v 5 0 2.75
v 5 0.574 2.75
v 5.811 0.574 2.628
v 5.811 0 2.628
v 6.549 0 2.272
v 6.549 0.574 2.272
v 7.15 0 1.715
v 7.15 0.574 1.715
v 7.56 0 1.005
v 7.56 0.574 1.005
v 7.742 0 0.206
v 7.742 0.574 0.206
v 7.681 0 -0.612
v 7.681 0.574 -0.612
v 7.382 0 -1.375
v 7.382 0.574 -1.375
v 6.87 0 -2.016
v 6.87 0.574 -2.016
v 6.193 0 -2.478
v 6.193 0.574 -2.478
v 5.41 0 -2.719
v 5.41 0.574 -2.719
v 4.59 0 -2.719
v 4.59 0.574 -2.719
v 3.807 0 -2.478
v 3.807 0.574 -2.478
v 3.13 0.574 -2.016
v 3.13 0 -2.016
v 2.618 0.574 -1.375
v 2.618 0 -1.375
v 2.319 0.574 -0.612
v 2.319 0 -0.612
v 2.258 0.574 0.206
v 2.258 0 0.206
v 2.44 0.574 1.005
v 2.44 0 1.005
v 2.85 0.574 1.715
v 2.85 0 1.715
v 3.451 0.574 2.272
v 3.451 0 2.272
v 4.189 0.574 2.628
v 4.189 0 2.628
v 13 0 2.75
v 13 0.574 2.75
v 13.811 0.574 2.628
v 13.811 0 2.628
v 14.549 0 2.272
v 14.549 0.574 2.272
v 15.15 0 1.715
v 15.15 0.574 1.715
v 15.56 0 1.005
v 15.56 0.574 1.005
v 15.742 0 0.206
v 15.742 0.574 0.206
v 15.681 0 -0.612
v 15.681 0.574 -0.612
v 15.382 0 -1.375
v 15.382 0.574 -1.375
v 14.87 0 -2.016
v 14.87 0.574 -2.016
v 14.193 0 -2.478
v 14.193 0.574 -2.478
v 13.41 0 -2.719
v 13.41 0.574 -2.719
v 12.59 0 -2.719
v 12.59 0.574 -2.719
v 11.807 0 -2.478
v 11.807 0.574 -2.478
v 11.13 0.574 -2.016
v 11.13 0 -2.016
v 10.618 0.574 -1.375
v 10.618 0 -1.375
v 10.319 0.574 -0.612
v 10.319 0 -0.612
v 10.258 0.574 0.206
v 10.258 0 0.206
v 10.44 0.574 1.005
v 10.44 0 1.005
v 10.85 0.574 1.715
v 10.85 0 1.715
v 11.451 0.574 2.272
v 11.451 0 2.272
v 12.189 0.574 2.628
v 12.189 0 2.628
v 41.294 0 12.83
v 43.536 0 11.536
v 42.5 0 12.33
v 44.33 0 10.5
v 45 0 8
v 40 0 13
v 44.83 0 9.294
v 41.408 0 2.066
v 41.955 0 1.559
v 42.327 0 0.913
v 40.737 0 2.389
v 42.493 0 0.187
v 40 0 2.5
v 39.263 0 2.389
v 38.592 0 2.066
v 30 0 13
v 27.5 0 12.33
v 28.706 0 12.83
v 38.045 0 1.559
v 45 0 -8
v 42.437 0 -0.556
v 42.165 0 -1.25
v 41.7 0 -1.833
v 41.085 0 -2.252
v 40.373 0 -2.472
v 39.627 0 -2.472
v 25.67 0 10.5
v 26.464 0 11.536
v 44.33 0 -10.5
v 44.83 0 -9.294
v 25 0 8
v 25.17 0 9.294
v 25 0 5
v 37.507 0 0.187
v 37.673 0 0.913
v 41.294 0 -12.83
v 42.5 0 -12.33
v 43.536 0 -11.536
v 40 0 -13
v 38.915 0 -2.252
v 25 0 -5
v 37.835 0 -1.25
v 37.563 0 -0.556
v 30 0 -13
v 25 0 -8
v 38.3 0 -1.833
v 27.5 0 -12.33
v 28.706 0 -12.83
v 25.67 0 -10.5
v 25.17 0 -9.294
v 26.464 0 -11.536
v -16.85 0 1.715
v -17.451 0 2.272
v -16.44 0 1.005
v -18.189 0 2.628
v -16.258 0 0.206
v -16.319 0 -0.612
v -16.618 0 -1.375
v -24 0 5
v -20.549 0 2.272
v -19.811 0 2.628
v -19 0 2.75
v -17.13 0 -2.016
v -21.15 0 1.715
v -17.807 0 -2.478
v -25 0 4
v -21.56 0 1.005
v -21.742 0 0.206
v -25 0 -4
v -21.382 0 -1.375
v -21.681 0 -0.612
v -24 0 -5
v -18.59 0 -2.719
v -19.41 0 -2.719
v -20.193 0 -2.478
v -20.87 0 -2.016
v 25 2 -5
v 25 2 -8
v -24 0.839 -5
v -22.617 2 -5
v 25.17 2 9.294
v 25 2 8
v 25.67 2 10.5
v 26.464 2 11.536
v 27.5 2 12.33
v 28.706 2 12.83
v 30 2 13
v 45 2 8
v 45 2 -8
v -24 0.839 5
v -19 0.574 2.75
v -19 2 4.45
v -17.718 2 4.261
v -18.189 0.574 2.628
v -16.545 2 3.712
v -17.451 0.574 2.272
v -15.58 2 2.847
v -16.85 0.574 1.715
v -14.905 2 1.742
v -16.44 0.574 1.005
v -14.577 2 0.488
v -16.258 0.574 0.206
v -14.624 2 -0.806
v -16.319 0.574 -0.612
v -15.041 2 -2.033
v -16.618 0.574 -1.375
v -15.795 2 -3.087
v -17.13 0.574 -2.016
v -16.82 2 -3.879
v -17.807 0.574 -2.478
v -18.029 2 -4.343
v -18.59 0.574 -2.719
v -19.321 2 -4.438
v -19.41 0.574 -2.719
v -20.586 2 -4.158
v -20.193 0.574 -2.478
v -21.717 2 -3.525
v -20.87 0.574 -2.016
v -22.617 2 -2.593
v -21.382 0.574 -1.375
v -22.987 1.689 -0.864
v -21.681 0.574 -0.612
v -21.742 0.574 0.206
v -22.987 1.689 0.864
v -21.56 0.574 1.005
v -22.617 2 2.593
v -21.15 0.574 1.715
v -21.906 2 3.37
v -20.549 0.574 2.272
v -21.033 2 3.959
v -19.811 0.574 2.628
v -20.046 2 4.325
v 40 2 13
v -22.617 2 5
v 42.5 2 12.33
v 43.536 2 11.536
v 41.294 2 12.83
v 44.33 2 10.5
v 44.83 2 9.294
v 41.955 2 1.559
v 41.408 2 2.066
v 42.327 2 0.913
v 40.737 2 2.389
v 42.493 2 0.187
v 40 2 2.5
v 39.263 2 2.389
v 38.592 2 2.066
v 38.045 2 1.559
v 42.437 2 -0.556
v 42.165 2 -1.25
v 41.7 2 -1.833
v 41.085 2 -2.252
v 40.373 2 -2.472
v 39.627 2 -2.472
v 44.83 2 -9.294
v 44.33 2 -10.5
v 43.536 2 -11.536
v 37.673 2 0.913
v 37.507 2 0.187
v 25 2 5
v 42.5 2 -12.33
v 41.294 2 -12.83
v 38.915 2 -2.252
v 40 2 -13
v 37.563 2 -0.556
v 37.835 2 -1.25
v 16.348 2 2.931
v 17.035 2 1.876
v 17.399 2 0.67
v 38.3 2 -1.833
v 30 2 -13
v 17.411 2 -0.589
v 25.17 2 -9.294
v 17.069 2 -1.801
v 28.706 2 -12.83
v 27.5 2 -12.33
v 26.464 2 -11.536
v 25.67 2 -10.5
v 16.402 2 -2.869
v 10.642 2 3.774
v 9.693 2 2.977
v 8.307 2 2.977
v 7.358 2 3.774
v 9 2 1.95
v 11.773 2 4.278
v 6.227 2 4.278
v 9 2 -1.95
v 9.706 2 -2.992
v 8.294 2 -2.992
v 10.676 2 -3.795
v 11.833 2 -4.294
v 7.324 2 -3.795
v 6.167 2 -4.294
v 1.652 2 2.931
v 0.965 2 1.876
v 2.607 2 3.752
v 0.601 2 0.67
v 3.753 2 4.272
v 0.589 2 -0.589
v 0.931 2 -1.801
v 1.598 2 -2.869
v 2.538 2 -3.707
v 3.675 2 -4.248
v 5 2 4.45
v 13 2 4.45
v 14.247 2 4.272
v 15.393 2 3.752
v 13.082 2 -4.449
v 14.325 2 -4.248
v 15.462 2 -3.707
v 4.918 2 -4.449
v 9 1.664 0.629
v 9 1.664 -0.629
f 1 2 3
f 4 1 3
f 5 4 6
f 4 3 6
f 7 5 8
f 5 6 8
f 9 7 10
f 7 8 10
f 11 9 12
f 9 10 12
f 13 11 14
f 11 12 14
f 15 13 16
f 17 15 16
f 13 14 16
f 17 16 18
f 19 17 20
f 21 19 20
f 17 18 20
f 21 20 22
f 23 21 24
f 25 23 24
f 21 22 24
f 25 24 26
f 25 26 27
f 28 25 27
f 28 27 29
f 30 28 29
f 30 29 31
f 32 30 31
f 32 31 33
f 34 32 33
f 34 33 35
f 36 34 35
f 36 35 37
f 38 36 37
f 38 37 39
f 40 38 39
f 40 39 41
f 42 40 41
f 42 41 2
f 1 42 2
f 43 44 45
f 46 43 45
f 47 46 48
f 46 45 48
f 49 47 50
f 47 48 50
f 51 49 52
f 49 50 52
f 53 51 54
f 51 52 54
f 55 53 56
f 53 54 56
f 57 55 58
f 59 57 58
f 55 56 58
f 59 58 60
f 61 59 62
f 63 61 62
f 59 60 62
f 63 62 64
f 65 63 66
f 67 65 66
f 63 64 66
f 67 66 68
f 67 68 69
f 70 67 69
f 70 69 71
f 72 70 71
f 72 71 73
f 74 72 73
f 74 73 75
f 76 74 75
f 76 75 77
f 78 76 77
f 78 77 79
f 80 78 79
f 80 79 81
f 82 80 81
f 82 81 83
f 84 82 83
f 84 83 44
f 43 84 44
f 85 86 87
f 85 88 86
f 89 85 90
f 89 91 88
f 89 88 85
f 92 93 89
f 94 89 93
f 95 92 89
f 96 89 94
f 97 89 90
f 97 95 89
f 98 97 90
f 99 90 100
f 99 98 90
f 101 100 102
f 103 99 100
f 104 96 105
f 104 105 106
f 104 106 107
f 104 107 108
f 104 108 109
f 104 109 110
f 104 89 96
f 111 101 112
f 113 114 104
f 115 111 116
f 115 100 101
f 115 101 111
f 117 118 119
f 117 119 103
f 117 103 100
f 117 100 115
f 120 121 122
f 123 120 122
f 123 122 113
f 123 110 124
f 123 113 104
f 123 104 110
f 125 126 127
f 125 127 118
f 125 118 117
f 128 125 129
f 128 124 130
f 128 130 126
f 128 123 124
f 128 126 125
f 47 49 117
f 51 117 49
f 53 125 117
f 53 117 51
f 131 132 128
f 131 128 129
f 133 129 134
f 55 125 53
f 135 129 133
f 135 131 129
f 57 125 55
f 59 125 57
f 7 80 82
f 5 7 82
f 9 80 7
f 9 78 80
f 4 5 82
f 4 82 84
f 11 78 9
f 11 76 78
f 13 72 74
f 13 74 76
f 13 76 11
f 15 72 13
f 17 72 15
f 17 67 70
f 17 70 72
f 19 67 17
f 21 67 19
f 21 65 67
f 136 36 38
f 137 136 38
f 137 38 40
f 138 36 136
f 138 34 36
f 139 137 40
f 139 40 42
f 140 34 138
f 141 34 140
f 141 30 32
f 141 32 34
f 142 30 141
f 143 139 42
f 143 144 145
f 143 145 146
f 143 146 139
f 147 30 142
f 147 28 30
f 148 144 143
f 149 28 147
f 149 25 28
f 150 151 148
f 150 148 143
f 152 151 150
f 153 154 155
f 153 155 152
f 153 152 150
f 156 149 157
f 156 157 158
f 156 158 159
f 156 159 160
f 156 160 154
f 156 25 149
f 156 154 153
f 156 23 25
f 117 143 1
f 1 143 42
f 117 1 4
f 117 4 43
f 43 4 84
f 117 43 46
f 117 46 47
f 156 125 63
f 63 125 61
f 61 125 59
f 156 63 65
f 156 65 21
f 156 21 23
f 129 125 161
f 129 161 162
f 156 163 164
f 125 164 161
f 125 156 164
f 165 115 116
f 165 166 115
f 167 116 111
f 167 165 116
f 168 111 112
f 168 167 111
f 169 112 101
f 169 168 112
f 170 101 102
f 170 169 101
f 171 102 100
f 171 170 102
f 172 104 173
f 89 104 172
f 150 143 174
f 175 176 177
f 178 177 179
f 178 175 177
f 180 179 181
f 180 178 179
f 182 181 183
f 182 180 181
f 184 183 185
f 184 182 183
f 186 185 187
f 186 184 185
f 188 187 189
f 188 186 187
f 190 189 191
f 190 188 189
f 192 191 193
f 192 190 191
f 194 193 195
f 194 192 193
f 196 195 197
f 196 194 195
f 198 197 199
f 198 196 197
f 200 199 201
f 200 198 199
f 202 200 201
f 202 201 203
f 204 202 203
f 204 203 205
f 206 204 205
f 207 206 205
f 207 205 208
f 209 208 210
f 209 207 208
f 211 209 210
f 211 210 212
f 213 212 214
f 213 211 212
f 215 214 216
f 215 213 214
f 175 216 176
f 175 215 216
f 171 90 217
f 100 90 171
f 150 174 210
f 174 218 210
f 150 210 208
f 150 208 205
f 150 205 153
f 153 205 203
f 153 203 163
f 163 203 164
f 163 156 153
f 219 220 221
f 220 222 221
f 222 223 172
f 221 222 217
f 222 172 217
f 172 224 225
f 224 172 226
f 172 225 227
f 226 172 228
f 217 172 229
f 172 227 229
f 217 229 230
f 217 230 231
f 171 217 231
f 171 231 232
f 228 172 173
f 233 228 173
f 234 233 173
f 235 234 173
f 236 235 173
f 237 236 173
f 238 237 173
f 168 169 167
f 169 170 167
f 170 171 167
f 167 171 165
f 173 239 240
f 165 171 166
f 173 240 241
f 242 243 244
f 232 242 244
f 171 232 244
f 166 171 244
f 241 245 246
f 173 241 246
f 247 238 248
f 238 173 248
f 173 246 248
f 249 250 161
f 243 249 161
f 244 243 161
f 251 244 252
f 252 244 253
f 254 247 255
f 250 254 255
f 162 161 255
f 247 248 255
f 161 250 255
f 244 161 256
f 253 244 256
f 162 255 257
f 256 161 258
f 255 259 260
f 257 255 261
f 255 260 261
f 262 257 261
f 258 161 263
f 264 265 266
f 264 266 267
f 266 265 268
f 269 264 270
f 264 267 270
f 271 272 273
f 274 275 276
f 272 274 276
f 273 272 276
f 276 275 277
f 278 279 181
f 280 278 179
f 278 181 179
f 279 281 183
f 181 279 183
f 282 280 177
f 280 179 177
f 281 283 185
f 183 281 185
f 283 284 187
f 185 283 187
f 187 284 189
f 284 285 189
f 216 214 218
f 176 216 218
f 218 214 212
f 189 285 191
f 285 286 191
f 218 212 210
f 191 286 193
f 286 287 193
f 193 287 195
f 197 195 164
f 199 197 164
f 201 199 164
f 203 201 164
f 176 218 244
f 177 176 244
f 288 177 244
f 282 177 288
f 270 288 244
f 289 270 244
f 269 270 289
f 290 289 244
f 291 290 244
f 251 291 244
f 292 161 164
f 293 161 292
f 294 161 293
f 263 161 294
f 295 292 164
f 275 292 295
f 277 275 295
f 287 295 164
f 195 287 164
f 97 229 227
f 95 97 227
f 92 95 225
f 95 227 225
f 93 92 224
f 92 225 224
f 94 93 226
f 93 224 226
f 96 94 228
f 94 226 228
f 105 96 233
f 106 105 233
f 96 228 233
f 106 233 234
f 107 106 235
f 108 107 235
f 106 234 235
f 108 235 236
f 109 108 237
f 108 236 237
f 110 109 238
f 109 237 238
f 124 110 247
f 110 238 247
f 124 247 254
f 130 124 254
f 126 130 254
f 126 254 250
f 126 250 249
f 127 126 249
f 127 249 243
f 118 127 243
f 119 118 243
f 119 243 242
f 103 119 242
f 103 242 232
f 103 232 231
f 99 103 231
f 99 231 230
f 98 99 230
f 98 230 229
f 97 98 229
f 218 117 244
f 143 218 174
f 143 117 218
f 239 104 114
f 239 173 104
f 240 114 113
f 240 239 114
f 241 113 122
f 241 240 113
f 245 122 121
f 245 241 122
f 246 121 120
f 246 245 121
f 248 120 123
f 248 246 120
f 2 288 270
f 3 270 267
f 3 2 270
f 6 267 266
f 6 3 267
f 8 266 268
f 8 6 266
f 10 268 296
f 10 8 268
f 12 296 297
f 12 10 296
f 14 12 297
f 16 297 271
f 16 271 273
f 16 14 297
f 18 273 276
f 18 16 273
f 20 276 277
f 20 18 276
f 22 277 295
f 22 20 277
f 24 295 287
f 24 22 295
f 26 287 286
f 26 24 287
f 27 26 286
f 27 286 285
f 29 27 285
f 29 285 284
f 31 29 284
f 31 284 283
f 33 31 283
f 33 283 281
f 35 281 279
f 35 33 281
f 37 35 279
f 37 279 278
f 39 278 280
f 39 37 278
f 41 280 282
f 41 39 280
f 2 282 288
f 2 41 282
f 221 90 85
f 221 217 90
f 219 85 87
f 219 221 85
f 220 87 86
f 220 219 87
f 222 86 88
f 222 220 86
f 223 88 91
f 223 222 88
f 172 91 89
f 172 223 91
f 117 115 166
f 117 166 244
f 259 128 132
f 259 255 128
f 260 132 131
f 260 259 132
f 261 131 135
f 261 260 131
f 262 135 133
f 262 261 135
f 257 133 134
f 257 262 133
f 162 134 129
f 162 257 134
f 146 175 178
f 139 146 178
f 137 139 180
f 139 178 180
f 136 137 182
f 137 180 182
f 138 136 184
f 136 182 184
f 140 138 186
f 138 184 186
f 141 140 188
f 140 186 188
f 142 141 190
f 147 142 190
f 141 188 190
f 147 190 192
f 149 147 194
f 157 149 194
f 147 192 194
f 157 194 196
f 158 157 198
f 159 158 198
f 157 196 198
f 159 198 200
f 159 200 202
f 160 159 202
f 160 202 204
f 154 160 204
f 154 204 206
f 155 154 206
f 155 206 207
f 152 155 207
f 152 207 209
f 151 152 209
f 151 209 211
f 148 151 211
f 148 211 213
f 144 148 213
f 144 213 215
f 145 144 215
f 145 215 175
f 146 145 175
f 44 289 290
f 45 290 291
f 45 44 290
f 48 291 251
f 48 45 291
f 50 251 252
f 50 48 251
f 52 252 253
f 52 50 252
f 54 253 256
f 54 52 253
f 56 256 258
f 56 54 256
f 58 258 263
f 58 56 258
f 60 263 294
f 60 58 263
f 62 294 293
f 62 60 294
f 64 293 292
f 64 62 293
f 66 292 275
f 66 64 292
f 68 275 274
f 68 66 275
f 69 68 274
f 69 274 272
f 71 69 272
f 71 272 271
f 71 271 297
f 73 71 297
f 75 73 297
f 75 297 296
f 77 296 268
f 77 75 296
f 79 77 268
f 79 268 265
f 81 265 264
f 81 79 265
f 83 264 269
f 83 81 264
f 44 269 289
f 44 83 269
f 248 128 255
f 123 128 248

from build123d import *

# Parameters (mm, degrees)
BOSS_EXTRUDE1_DEPTH = 2
CHAMFER1_SIZE       = 1
FILLET1_R           = 5
SKETCH2_R           = 2.5
CUT_EXTRUDE1_DEPTH  = 3
SKETCH3_R           = 2.75
CUT_EXTRUDE2_DEPTH  = 3
CHAMFER2_SIZE2      = 2.383507185
CHAMFER2_SIZE       = 2
CHAMFER3_SIZE       = 1.7
CHAMFER3_SIZE_2     = 1.426469373


# Some blends are built 0.0001 mm under size
with BuildPart() as part:
    # Sketch1 → Boss-Extrude1 (new body)
    with BuildSketch(Plane(origin=(0, 0, 0), x_dir=(1, 0, 0), z_dir=(0, 1, 0))):
        Polygon((25, 5), (25, 13), (45, 13), (45, -13), (25, -13), (25, -5), (-25, -5), (-25, 5), align=None)
    extrude(amount=BOSS_EXTRUDE1_DEPTH)

    # Chamfer1
    chamfer1_edges = [part.edges().sort_by_distance(p)[0] for p in [
        (-25, 1, 5),
        (-25, 1, -5),
    ]]
    chamfer(chamfer1_edges, length=CHAMFER1_SIZE)

    # Fillet1
    fillet1_edges = [part.edges().sort_by_distance(p)[0] for p in [
        (25, 1, -13),
        (45, 1, -13),
        (45, 1, 13),
        (25, 1, 13),
    ]]
    fillet(fillet1_edges, radius=FILLET1_R)

    # Sketch2 → Cut-Extrude1 (cut)
    with BuildSketch(Plane(origin=(0, 2, 0), x_dir=(1, 0, 0), z_dir=(0, 1, 0))):
        with Locations(Location((40, 0, 0), (0, 0, 270))):
            Circle(SKETCH2_R)
    extrude(amount=-CUT_EXTRUDE1_DEPTH, mode=Mode.SUBTRACT)

    # Sketch3 → Cut-Extrude2 (cut)
    with BuildSketch(Plane(origin=(0, 2, 0), x_dir=(1, 0, 0), z_dir=(0, 1, 0))):
        with Locations(Location((13, 0, 0), (0, 0, 270))):
            Circle(SKETCH3_R)
        with Locations(Location((5, 0, 0), (0, 0, 270))):
            Circle(SKETCH3_R)
        with Locations(Location((-19, 0, 0), (0, 0, 270))):
            Circle(SKETCH3_R)
    extrude(amount=-CUT_EXTRUDE2_DEPTH, mode=Mode.SUBTRACT)

    # Chamfer2
    chamfer2_edges = [part.edges().sort_by_distance(p)[0] for p in [
        (-25, 2, 0),
    ]]
    chamfer2_side = [part.faces().sort_by_distance(p)[0] for p in [
        (-25, 1.96, 0),
    ]]
    chamfer(chamfer2_edges, length=CHAMFER2_SIZE - 0.0001, length2=CHAMFER2_SIZE2 - 0.0001, reference=chamfer2_side[0])  # a hair under: the kernel refuses the full size

    # Chamfer3
    # the kernel refuses this chamfer: 1.7, 1.426469373 mm, written as the material it takes off along each edge
    with BuildSketch(Plane(origin=(13, 2, 0), x_dir=(0, 0, 1), z_dir=(-1, 0, 0))) as chamfer3_piece_1:
        Polygon((2.75 + CHAMFER3_SIZE, 0), (2.75, -CHAMFER3_SIZE_2), (2.75, 0), align=None)
    revolve(axis=Axis((13, 2, 0), (0, 1, 0)), mode=Mode.SUBTRACT)
    with BuildSketch(Plane(origin=(5, 2, 0), x_dir=(0, 0, 1), z_dir=(-1, 0, 0))) as chamfer3_piece_2:
        Polygon((2.75 + CHAMFER3_SIZE, 0), (2.75, -CHAMFER3_SIZE_2), (2.75, 0), align=None)
    revolve(axis=Axis((5, 2, 0), (0, 1, 0)), mode=Mode.SUBTRACT)
    with BuildSketch(Plane(origin=(-19, 2, 0), x_dir=(0, 0, 1), z_dir=(-1, 0, 0))) as chamfer3_piece_3:
        Polygon((2.75 + CHAMFER3_SIZE, 0), (2.75, -CHAMFER3_SIZE_2), (2.75, 0), align=None)
    revolve(axis=Axis((-19, 2, 0), (0, 1, 0)), mode=Mode.SUBTRACT)


solid = part.part
